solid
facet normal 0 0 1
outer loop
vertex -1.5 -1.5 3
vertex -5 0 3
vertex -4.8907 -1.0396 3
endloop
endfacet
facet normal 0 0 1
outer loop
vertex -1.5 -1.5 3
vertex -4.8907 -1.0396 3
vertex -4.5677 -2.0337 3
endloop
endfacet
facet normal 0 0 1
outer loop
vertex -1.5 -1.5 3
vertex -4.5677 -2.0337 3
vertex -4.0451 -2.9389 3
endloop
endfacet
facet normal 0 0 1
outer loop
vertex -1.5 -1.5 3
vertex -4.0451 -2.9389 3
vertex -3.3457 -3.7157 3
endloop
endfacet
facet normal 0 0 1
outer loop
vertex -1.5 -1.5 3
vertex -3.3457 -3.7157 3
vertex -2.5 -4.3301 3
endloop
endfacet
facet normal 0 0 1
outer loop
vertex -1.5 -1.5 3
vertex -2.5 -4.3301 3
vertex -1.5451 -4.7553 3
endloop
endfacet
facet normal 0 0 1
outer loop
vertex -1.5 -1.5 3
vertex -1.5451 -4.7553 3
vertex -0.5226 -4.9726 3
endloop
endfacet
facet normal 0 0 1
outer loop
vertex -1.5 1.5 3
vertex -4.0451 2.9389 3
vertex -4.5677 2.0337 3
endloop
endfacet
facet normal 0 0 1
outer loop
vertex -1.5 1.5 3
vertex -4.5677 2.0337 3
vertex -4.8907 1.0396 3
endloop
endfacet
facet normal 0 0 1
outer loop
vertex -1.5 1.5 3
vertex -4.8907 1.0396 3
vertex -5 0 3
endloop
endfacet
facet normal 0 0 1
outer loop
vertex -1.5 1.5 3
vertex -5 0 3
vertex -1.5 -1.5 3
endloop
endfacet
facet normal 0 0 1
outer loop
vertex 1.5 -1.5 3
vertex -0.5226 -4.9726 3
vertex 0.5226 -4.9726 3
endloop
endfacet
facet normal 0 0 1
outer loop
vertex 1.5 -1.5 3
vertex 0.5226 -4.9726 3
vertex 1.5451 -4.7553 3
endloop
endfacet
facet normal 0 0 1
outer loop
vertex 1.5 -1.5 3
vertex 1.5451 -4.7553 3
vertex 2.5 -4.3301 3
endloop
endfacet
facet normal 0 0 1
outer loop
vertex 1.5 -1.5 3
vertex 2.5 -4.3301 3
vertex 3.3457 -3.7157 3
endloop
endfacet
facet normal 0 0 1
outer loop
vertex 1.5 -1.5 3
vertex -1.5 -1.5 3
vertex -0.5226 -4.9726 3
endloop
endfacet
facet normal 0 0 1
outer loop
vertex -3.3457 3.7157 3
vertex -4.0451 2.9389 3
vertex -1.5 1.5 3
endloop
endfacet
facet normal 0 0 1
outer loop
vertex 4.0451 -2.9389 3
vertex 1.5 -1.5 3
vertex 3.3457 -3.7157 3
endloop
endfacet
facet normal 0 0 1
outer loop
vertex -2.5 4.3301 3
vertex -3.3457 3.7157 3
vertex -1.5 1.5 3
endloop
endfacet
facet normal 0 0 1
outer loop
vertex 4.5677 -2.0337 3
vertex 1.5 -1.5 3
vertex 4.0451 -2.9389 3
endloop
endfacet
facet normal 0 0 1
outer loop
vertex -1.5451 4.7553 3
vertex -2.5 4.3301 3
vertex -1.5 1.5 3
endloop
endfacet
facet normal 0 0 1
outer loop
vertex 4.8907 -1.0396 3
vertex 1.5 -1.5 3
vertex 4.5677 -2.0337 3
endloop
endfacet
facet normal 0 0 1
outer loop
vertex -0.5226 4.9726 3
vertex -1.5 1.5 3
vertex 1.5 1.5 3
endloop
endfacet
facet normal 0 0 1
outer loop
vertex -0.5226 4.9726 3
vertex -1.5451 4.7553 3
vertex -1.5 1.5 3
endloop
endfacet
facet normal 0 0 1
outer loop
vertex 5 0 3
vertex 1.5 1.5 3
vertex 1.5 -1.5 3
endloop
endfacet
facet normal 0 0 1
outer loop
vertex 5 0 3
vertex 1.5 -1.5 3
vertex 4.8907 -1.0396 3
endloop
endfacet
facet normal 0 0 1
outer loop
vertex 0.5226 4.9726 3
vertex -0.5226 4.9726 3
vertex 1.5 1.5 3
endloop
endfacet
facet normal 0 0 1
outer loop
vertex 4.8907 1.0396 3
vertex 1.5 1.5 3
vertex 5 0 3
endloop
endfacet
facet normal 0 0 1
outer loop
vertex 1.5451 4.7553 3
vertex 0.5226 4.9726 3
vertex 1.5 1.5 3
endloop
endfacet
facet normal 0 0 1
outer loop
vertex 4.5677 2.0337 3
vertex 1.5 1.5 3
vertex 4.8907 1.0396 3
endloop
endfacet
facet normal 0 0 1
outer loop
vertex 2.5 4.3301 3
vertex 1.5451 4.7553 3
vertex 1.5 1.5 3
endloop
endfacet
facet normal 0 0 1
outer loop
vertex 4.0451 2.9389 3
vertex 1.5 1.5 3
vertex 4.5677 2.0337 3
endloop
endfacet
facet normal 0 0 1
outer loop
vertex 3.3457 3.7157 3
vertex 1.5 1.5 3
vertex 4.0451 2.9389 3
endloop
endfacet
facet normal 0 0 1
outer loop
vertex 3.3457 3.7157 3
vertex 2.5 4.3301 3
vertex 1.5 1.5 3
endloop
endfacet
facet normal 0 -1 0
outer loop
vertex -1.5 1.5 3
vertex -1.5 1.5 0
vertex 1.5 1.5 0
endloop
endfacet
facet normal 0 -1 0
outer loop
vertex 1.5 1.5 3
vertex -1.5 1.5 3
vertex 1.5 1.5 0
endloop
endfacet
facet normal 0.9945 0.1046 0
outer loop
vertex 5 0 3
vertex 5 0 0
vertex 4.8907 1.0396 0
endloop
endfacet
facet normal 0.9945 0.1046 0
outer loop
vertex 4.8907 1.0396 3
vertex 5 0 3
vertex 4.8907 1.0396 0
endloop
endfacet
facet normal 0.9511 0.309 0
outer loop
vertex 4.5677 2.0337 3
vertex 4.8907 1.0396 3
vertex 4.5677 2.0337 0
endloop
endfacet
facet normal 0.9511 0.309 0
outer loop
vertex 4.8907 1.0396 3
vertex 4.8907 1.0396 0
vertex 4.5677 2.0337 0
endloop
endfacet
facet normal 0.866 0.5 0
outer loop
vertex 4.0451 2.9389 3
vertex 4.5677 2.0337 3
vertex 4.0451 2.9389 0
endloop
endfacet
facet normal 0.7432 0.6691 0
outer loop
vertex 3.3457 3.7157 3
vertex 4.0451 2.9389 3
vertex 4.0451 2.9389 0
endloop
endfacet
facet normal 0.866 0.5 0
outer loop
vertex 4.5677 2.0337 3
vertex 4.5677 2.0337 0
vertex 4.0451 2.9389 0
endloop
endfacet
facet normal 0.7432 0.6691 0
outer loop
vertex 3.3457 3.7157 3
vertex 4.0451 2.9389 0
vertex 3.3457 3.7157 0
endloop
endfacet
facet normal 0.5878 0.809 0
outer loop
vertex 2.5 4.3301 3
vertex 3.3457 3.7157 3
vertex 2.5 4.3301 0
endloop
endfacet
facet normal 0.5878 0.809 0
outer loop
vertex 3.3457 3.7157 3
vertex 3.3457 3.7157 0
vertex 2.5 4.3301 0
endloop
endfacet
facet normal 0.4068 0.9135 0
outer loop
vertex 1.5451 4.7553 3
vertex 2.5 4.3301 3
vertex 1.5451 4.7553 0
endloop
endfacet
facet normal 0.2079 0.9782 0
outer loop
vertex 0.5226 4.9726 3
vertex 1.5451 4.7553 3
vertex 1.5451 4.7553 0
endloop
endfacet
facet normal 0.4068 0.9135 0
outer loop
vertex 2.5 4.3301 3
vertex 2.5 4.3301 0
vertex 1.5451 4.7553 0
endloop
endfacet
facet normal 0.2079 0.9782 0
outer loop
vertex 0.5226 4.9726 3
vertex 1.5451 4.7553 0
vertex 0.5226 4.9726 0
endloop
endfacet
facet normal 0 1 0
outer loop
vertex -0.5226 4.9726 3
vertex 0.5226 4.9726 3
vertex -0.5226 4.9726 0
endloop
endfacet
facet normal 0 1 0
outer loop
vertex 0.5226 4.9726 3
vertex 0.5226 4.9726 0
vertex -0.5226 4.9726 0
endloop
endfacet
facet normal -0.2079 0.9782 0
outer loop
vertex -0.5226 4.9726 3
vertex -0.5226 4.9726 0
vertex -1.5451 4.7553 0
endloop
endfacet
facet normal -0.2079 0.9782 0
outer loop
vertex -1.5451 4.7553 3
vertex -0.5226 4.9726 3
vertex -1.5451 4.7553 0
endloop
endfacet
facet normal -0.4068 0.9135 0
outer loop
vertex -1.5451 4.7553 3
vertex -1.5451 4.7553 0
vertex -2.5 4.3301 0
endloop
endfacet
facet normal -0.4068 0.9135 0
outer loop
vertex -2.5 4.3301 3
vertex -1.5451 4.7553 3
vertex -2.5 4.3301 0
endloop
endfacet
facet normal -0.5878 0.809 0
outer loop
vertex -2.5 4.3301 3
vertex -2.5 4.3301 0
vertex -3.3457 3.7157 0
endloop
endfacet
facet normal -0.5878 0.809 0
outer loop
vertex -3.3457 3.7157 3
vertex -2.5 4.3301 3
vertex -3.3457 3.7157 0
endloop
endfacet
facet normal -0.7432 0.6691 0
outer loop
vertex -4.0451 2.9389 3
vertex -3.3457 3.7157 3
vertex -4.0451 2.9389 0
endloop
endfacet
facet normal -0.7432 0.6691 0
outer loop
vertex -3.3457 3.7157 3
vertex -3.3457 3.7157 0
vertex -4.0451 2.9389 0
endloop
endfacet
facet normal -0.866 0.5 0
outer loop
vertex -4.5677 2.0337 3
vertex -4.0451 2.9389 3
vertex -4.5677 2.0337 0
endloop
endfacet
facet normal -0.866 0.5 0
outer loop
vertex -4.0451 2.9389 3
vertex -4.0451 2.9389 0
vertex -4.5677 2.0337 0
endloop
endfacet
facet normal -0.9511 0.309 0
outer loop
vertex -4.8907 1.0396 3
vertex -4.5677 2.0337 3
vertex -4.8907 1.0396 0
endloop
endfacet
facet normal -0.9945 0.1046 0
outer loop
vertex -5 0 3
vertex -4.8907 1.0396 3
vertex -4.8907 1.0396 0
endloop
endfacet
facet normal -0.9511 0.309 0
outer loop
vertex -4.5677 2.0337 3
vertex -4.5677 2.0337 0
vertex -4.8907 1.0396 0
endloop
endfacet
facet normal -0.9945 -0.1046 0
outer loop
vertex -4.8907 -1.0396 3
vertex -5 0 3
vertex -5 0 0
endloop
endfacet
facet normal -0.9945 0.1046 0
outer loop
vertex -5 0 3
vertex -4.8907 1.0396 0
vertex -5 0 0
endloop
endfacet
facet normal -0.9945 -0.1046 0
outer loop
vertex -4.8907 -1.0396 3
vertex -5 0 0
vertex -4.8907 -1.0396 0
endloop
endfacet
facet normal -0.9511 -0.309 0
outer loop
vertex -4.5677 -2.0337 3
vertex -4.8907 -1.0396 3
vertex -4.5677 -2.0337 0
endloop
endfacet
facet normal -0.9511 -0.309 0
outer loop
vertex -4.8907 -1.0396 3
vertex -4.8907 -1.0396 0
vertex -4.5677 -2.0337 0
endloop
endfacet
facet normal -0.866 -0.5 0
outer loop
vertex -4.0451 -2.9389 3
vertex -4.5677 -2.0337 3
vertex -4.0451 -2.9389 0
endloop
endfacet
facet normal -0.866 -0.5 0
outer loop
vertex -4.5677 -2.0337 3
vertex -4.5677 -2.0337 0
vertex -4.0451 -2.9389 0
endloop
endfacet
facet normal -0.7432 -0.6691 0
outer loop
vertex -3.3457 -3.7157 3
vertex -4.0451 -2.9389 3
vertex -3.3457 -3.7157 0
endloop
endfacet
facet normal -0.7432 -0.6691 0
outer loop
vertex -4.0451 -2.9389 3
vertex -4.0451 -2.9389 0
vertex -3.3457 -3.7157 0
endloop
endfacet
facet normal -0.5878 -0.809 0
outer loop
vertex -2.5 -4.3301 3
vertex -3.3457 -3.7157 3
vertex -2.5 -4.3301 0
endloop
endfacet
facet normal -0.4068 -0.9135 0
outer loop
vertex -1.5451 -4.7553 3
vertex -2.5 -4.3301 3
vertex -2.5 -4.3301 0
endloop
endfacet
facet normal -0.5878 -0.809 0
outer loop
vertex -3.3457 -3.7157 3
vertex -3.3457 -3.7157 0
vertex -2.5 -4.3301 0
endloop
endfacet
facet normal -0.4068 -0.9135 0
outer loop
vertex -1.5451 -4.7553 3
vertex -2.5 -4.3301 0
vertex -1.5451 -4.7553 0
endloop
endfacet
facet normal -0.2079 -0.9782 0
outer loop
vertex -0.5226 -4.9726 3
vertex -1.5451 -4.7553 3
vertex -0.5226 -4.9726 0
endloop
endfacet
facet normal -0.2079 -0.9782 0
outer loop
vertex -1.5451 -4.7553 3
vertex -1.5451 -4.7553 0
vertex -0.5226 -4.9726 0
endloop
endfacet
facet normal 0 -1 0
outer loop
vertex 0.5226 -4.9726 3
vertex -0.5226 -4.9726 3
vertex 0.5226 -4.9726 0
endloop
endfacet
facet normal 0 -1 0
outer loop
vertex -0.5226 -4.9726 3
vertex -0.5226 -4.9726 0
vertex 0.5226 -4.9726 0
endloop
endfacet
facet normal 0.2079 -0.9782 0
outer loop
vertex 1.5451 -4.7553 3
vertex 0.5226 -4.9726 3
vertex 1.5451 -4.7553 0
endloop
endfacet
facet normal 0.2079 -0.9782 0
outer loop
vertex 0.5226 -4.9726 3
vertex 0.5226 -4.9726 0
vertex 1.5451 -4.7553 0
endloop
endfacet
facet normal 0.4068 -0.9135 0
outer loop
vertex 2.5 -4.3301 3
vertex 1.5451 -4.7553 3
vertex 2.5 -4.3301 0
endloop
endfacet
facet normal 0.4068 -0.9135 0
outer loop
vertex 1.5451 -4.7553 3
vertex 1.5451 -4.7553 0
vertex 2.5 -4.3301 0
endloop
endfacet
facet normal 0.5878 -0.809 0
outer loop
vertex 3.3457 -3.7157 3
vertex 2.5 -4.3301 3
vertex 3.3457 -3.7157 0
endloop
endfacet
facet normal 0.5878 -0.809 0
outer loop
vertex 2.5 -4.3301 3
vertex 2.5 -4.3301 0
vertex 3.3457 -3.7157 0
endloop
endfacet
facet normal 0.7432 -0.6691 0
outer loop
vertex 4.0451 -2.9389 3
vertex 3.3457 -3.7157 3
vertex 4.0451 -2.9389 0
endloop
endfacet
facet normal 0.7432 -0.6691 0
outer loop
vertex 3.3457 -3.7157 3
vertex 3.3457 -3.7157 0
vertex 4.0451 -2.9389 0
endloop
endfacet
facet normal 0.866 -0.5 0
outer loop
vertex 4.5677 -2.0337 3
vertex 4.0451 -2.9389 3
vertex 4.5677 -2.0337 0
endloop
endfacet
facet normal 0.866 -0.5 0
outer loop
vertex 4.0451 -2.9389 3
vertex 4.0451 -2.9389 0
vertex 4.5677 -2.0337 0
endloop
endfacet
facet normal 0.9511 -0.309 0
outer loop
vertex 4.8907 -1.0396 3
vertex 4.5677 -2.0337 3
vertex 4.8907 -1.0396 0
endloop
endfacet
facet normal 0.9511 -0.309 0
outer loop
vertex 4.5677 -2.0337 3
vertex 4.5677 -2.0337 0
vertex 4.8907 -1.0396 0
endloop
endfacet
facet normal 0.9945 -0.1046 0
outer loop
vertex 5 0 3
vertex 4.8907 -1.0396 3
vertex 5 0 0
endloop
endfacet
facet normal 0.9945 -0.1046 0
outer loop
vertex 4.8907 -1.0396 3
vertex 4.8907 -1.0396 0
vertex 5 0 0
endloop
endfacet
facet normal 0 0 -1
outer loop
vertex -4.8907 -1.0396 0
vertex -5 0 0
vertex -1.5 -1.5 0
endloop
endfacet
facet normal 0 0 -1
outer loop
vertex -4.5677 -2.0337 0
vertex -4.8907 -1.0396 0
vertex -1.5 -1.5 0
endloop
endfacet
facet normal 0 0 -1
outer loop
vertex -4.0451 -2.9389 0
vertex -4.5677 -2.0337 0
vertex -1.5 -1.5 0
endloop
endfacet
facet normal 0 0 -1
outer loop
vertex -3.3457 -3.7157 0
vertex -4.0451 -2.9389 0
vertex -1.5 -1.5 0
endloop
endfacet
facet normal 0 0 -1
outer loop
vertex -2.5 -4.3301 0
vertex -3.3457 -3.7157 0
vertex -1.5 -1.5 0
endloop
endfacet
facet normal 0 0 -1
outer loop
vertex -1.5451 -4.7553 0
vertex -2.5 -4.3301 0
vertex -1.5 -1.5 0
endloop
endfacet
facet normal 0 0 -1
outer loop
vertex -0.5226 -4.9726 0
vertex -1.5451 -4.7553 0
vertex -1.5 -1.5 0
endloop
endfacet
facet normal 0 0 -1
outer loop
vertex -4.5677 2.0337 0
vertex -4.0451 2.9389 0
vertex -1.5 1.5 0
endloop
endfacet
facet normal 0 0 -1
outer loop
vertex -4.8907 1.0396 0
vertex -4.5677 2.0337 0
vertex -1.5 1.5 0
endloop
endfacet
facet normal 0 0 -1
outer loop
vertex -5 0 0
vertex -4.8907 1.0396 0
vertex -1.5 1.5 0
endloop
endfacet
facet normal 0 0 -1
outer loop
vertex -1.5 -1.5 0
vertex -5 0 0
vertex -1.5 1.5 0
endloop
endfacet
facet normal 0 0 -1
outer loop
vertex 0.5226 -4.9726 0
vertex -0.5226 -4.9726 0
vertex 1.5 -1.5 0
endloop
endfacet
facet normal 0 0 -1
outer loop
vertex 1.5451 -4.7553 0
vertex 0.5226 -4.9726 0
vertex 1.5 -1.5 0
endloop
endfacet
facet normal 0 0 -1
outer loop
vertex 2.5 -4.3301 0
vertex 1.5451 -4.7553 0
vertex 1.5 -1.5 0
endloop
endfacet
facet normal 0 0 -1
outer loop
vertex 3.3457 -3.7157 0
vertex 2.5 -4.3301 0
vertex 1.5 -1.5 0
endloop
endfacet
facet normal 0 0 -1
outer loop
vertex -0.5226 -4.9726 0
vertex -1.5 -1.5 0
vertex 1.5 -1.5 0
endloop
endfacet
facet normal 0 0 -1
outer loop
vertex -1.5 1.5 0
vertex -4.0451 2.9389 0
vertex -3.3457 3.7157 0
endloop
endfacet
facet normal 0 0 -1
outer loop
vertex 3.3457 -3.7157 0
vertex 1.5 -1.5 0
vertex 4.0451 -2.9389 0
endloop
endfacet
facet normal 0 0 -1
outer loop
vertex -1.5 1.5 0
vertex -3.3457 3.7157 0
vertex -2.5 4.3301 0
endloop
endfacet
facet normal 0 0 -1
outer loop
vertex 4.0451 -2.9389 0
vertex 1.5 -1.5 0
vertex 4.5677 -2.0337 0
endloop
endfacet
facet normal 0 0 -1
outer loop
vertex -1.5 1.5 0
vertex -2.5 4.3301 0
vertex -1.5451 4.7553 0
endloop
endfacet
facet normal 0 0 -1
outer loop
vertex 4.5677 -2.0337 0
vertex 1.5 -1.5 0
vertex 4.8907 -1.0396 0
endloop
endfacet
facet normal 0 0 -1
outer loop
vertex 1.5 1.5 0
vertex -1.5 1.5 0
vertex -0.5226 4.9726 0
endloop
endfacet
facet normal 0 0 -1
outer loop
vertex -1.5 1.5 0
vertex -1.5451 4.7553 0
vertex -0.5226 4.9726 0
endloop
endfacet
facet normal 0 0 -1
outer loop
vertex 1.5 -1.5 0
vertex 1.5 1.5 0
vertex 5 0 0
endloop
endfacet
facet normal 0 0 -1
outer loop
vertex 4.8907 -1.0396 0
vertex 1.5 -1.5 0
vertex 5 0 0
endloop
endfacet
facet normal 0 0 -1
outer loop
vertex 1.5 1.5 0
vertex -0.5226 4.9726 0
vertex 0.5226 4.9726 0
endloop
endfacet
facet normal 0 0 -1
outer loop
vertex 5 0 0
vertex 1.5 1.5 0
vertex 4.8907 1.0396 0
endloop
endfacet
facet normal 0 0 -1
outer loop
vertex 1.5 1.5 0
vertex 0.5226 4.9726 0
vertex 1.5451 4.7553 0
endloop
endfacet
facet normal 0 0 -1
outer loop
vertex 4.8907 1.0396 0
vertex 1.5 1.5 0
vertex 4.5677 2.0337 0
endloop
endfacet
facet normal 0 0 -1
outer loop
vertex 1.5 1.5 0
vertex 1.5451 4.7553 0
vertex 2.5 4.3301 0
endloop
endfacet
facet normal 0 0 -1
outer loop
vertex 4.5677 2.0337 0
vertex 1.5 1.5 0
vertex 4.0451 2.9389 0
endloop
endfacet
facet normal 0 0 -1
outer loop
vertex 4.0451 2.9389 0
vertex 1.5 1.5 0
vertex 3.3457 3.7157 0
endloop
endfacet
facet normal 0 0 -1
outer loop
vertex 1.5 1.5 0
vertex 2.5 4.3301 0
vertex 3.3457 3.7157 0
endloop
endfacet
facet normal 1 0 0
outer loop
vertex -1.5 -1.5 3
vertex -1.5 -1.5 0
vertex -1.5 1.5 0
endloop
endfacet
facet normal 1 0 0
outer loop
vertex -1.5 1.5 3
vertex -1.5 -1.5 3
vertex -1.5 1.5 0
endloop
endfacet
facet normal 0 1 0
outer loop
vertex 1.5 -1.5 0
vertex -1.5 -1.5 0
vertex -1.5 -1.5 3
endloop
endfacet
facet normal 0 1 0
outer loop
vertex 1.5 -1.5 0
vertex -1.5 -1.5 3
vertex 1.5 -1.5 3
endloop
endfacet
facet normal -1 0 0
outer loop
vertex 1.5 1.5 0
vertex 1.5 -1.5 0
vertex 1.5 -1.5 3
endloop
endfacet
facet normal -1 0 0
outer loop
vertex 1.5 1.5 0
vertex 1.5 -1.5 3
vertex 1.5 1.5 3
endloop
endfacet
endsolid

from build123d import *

# Parameters (mm, degrees)
SKETCH2_R           = 5
SKETCH2_W           = 3
SKETCH2_H           = 3
BOSS_EXTRUDE2_DEPTH = 3


with BuildPart() as part:
    # Sketch2 → Boss-Extrude2 (new body)
    with BuildSketch(Plane.XY):
        Circle(SKETCH2_R)
        Rectangle(SKETCH2_W, SKETCH2_H, mode=Mode.SUBTRACT)
    extrude(amount=BOSS_EXTRUDE2_DEPTH)


solid = part.part
